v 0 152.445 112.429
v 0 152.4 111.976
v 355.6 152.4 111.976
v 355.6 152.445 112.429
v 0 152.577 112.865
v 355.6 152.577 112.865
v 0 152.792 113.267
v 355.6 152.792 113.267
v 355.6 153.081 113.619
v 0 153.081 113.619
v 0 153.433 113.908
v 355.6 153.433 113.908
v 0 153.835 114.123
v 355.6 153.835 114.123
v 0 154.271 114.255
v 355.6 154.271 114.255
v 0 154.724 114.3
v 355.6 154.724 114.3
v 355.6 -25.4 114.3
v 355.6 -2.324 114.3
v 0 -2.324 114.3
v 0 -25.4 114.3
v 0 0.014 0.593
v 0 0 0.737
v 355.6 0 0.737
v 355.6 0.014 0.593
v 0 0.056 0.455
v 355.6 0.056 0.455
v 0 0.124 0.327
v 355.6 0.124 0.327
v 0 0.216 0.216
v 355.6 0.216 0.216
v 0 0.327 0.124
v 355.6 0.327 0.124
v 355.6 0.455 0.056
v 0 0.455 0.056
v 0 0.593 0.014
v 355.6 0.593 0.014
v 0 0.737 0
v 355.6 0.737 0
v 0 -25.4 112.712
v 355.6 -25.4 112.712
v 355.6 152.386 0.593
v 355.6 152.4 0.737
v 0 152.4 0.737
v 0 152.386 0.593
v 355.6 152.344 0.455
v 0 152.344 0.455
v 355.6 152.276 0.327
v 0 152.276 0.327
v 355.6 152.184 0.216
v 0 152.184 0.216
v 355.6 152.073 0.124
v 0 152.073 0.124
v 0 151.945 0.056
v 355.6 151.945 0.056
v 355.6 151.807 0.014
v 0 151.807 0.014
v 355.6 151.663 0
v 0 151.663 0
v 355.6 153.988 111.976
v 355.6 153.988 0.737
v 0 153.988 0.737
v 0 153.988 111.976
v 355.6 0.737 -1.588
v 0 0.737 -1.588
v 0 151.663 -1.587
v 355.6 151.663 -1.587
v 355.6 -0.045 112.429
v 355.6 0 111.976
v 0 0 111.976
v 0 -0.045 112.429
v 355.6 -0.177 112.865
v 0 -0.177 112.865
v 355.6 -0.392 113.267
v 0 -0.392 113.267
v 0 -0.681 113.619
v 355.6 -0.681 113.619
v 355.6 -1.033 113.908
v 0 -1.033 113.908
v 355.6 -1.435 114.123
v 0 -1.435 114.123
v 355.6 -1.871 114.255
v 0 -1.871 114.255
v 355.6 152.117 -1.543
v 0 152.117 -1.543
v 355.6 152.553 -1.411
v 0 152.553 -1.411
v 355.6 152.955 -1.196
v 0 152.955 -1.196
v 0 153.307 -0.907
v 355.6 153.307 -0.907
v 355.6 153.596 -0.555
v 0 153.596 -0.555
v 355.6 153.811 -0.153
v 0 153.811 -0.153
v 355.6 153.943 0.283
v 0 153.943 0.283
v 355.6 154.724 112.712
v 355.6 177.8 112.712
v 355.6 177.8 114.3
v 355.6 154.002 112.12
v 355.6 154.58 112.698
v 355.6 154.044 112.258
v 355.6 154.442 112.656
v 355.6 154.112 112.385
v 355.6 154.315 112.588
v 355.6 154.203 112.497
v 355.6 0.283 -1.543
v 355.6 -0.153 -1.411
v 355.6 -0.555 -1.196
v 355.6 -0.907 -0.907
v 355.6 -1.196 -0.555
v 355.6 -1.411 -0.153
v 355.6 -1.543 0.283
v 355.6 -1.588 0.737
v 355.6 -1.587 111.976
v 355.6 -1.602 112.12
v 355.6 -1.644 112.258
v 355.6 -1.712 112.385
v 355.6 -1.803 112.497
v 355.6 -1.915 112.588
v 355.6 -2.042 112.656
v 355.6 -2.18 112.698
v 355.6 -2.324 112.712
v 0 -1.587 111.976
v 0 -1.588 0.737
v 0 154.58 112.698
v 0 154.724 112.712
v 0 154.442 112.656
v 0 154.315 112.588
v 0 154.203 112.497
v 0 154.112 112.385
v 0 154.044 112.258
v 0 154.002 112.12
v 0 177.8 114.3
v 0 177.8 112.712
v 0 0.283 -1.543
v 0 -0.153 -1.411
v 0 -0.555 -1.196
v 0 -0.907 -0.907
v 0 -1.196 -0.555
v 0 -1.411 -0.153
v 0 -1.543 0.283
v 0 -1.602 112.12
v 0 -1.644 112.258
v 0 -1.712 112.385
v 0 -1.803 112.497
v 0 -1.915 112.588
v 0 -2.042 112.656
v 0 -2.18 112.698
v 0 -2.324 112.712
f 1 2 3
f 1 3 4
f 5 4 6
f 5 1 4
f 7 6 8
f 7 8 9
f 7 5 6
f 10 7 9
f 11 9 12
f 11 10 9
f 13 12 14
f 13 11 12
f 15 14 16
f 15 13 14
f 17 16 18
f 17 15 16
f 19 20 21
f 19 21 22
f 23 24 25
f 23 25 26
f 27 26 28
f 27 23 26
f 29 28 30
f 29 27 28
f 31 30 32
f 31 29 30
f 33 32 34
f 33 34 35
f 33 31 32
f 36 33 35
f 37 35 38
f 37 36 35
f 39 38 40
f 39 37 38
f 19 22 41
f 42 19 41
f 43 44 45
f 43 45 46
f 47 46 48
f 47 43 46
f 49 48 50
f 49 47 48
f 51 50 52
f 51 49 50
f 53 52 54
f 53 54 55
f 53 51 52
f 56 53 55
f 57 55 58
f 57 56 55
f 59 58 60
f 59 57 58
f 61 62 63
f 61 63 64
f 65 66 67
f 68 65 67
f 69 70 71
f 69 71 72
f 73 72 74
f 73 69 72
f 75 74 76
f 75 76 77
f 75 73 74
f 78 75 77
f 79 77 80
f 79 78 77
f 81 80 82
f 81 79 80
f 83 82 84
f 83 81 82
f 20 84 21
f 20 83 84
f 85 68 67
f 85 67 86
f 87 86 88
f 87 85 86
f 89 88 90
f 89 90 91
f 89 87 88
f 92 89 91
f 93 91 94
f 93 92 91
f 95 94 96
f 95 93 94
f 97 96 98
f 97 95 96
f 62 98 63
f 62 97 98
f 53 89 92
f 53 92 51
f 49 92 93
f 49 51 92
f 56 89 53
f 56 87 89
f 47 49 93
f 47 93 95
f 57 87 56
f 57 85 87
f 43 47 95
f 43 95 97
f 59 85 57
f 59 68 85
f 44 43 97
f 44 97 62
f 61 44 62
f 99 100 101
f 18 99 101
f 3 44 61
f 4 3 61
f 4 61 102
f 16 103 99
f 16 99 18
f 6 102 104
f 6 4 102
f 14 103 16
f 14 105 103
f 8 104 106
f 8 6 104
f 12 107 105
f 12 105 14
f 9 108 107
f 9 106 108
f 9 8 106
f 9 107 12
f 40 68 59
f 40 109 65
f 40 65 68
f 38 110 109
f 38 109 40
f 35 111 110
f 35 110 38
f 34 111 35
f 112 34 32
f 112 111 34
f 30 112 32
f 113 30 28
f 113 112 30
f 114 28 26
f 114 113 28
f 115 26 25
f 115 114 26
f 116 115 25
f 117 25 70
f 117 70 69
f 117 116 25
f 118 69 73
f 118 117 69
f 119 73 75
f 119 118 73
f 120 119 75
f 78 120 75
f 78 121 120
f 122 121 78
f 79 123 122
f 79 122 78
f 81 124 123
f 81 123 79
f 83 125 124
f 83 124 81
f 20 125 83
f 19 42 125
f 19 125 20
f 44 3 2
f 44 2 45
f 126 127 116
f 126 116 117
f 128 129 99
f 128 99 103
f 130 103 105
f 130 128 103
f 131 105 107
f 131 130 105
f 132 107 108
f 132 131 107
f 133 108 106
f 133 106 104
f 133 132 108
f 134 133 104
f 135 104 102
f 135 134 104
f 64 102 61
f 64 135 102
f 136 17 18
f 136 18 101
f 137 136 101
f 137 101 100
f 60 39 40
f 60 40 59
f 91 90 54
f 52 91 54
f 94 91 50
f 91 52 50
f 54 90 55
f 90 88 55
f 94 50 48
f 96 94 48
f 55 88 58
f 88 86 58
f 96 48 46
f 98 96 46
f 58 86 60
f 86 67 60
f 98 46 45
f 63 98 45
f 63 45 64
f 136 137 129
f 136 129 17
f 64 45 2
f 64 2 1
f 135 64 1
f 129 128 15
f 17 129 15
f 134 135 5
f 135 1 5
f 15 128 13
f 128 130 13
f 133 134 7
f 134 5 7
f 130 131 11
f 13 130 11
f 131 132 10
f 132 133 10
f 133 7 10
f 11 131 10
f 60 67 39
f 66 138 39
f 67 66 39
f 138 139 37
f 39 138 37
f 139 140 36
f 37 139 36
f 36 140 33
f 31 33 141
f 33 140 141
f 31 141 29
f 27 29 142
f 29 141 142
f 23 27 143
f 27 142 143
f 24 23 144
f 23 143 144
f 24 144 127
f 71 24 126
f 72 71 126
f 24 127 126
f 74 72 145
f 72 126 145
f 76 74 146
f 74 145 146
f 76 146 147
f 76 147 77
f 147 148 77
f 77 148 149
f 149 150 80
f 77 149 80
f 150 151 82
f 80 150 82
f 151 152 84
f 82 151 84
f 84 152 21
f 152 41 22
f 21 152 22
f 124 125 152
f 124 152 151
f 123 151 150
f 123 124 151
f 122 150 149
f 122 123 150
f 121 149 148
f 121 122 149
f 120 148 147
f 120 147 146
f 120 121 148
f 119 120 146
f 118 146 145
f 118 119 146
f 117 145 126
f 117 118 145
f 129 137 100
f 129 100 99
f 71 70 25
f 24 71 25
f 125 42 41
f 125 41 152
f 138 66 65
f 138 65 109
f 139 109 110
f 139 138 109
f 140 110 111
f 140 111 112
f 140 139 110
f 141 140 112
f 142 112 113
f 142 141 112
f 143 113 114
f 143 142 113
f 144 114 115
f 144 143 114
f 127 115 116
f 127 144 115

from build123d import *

# Parameters (mm, degrees)
SKETCH1_W                      = 1.5875
SKETCH1_H                      = 152.4
BASE_FLANGE1_DEPTH             = 355.6
EDGE_FLANGE1_STRIP_W           = 7.8232
EDGE_FLANGE1_STRIP_H           = 1.5875
EDGE_FLANGE1_STRIP_CUT_DEPTH   = 355.6
EDGE_FLANGE1_STRIP_2_W         = 7.8232
EDGE_FLANGE1_STRIP_2_H         = 1.5875
EDGE_FLANGE1_STRIP_CUT_2_DEPTH = 355.6
EDGE_FLANGE1_DEPTH             = 355.6
EDGE_FLANGE1_BEND_DEPTH        = 355.6
EDGE_FLANGE2_STRIP_W           = 7.8232
EDGE_FLANGE2_STRIP_H           = 1.5875
EDGE_FLANGE2_STRIP_CUT_DEPTH   = 355.6
EDGE_FLANGE2_STRIP_2_W         = 7.8232
EDGE_FLANGE2_STRIP_2_H         = 1.5875
EDGE_FLANGE2_STRIP_CUT_2_DEPTH = 355.6
EDGE_FLANGE2_DEPTH             = 355.6
EDGE_FLANGE2_BEND_DEPTH        = 355.6


# Sheet-metal steps are written as plain solids
with BuildPart() as part:
    # Sketch1 → Base-Flange1 (new body)
    with BuildSketch(Plane(origin=(0, 0, 0), x_dir=(0, 0, -1), z_dir=(1, 0, 0))):
        with Locations((0.79375, 76.2)):
            Rectangle(SKETCH1_W, SKETCH1_H)
    extrude(amount=BASE_FLANGE1_DEPTH)

    # Edge-Flange1 strip (across the edge) → Edge-Flange1 strip cut (cut)
    with BuildSketch(Plane(origin=(355.6, 152.4, 0), x_dir=(0, -1, 0), z_dir=(-1, 0, 0))):
        with Locations((-3.175, -0.79375)):
            Rectangle(EDGE_FLANGE1_STRIP_W, EDGE_FLANGE1_STRIP_H)
    extrude(amount=EDGE_FLANGE1_STRIP_CUT_DEPTH, mode=Mode.SUBTRACT)

    # Edge-Flange1 strip 2 (across the edge) → Edge-Flange1 strip cut 2 (cut)
    with BuildSketch(Plane.YZ):
        with Locations((-3.175, -0.79375)):
            Rectangle(EDGE_FLANGE1_STRIP_2_W, EDGE_FLANGE1_STRIP_2_H)
    extrude(amount=EDGE_FLANGE1_STRIP_CUT_2_DEPTH, mode=Mode.SUBTRACT)

    # Edge-Flange1 section (across the edge) → Edge-Flange1 (add)
    with BuildSketch(Plane(origin=(355.6, 152.4, 0), x_dir=(0, -1, 0), z_dir=(-1, 0, 0))):
        with BuildLine():
            Line((-1.5875, 0.7366), (-1.5875, 112.7125))
            Line((-1.5875, 112.7125), (0, 112.7125))
            Line((0, 112.7125), (0, 0.7366))
            ThreePointArc((0, 0.7366), (0.215745145, 0.215745145), (0.7366, 0))
            Line((0.7366, 0), (0.7366, -1.5875))
            ThreePointArc((0.7366, -1.5875), (-0.90678687, -0.90678687), (-1.5875, 0.7366))
        make_face()
    extrude(amount=EDGE_FLANGE1_DEPTH)

    # Edge-Flange1 section 2 (across the edge) → Edge-Flange1 bend (add)
    with BuildSketch(Plane.YZ):
        with BuildLine():
            Line((-1.5875, 0.7366), (-1.5875, 112.7125))
            Line((-1.5875, 112.7125), (0, 112.7125))
            Line((0, 112.7125), (0, 0.7366))
            ThreePointArc((0, 0.7366), (0.215745145, 0.215745145), (0.7366, 0))
            Line((0.7366, 0), (0.7366, -1.5875))
            ThreePointArc((0.7366, -1.5875), (-0.90678687, -0.90678687), (-1.5875, 0.7366))
        make_face()
    extrude(amount=EDGE_FLANGE1_BEND_DEPTH)

    # Edge-Flange2 strip (across the edge) → Edge-Flange2 strip cut (cut)
    with BuildSketch(Plane(origin=(0, 153.9875, 112.7125), x_dir=(0, 0, -1), z_dir=(1, 0, 0))):
        with Locations((-3.175, -0.79375)):
            Rectangle(EDGE_FLANGE2_STRIP_W, EDGE_FLANGE2_STRIP_H)
    extrude(amount=EDGE_FLANGE2_STRIP_CUT_DEPTH, mode=Mode.SUBTRACT)

    # Edge-Flange2 strip 2 (across the edge) → Edge-Flange2 strip cut 2 (cut)
    with BuildSketch(Plane(origin=(355.6, -1.5875, 112.7125), x_dir=(0, 0, -1), z_dir=(-1, 0, 0))):
        with Locations((-3.175, -0.79375)):
            Rectangle(EDGE_FLANGE2_STRIP_2_W, EDGE_FLANGE2_STRIP_2_H)
    extrude(amount=EDGE_FLANGE2_STRIP_CUT_2_DEPTH, mode=Mode.SUBTRACT)

    # Edge-Flange2 section (across the edge) → Edge-Flange2 (add)
    with BuildSketch(Plane(origin=(0, 153.9875, 112.7125), x_dir=(0, 0, -1), z_dir=(1, 0, 0))):
        with BuildLine():
            Line((-1.5875, 0.7366), (-1.5875, 23.8125))
            Line((-1.5875, 23.8125), (0, 23.8125))
            Line((0, 23.8125), (0, 0.7366))
            ThreePointArc((0, 0.7366), (0.215745145, 0.215745145), (0.7366, 0))
            Line((0.7366, 0), (0.7366, -1.5875))
            ThreePointArc((0.7366, -1.5875), (-0.90678687, -0.90678687), (-1.5875, 0.7366))
        make_face()
    extrude(amount=EDGE_FLANGE2_DEPTH)

    # Edge-Flange2 section 2 (across the edge) → Edge-Flange2 bend (add)
    with BuildSketch(Plane(origin=(355.6, -1.5875, 112.7125), x_dir=(0, 0, -1), z_dir=(-1, 0, 0))):
        with BuildLine():
            Line((-1.5875, 0.7366), (-1.5875, 23.8125))
            Line((-1.5875, 23.8125), (0, 23.8125))
            Line((0, 23.8125), (0, 0.7366))
            ThreePointArc((0, 0.7366), (0.215745145, 0.215745145), (0.7366, 0))
            Line((0.7366, 0), (0.7366, -1.5875))
            ThreePointArc((0.7366, -1.5875), (-0.90678687, -0.90678687), (-1.5875, 0.7366))
        make_face()
    extrude(amount=EDGE_FLANGE2_BEND_DEPTH)


solid = part.part
